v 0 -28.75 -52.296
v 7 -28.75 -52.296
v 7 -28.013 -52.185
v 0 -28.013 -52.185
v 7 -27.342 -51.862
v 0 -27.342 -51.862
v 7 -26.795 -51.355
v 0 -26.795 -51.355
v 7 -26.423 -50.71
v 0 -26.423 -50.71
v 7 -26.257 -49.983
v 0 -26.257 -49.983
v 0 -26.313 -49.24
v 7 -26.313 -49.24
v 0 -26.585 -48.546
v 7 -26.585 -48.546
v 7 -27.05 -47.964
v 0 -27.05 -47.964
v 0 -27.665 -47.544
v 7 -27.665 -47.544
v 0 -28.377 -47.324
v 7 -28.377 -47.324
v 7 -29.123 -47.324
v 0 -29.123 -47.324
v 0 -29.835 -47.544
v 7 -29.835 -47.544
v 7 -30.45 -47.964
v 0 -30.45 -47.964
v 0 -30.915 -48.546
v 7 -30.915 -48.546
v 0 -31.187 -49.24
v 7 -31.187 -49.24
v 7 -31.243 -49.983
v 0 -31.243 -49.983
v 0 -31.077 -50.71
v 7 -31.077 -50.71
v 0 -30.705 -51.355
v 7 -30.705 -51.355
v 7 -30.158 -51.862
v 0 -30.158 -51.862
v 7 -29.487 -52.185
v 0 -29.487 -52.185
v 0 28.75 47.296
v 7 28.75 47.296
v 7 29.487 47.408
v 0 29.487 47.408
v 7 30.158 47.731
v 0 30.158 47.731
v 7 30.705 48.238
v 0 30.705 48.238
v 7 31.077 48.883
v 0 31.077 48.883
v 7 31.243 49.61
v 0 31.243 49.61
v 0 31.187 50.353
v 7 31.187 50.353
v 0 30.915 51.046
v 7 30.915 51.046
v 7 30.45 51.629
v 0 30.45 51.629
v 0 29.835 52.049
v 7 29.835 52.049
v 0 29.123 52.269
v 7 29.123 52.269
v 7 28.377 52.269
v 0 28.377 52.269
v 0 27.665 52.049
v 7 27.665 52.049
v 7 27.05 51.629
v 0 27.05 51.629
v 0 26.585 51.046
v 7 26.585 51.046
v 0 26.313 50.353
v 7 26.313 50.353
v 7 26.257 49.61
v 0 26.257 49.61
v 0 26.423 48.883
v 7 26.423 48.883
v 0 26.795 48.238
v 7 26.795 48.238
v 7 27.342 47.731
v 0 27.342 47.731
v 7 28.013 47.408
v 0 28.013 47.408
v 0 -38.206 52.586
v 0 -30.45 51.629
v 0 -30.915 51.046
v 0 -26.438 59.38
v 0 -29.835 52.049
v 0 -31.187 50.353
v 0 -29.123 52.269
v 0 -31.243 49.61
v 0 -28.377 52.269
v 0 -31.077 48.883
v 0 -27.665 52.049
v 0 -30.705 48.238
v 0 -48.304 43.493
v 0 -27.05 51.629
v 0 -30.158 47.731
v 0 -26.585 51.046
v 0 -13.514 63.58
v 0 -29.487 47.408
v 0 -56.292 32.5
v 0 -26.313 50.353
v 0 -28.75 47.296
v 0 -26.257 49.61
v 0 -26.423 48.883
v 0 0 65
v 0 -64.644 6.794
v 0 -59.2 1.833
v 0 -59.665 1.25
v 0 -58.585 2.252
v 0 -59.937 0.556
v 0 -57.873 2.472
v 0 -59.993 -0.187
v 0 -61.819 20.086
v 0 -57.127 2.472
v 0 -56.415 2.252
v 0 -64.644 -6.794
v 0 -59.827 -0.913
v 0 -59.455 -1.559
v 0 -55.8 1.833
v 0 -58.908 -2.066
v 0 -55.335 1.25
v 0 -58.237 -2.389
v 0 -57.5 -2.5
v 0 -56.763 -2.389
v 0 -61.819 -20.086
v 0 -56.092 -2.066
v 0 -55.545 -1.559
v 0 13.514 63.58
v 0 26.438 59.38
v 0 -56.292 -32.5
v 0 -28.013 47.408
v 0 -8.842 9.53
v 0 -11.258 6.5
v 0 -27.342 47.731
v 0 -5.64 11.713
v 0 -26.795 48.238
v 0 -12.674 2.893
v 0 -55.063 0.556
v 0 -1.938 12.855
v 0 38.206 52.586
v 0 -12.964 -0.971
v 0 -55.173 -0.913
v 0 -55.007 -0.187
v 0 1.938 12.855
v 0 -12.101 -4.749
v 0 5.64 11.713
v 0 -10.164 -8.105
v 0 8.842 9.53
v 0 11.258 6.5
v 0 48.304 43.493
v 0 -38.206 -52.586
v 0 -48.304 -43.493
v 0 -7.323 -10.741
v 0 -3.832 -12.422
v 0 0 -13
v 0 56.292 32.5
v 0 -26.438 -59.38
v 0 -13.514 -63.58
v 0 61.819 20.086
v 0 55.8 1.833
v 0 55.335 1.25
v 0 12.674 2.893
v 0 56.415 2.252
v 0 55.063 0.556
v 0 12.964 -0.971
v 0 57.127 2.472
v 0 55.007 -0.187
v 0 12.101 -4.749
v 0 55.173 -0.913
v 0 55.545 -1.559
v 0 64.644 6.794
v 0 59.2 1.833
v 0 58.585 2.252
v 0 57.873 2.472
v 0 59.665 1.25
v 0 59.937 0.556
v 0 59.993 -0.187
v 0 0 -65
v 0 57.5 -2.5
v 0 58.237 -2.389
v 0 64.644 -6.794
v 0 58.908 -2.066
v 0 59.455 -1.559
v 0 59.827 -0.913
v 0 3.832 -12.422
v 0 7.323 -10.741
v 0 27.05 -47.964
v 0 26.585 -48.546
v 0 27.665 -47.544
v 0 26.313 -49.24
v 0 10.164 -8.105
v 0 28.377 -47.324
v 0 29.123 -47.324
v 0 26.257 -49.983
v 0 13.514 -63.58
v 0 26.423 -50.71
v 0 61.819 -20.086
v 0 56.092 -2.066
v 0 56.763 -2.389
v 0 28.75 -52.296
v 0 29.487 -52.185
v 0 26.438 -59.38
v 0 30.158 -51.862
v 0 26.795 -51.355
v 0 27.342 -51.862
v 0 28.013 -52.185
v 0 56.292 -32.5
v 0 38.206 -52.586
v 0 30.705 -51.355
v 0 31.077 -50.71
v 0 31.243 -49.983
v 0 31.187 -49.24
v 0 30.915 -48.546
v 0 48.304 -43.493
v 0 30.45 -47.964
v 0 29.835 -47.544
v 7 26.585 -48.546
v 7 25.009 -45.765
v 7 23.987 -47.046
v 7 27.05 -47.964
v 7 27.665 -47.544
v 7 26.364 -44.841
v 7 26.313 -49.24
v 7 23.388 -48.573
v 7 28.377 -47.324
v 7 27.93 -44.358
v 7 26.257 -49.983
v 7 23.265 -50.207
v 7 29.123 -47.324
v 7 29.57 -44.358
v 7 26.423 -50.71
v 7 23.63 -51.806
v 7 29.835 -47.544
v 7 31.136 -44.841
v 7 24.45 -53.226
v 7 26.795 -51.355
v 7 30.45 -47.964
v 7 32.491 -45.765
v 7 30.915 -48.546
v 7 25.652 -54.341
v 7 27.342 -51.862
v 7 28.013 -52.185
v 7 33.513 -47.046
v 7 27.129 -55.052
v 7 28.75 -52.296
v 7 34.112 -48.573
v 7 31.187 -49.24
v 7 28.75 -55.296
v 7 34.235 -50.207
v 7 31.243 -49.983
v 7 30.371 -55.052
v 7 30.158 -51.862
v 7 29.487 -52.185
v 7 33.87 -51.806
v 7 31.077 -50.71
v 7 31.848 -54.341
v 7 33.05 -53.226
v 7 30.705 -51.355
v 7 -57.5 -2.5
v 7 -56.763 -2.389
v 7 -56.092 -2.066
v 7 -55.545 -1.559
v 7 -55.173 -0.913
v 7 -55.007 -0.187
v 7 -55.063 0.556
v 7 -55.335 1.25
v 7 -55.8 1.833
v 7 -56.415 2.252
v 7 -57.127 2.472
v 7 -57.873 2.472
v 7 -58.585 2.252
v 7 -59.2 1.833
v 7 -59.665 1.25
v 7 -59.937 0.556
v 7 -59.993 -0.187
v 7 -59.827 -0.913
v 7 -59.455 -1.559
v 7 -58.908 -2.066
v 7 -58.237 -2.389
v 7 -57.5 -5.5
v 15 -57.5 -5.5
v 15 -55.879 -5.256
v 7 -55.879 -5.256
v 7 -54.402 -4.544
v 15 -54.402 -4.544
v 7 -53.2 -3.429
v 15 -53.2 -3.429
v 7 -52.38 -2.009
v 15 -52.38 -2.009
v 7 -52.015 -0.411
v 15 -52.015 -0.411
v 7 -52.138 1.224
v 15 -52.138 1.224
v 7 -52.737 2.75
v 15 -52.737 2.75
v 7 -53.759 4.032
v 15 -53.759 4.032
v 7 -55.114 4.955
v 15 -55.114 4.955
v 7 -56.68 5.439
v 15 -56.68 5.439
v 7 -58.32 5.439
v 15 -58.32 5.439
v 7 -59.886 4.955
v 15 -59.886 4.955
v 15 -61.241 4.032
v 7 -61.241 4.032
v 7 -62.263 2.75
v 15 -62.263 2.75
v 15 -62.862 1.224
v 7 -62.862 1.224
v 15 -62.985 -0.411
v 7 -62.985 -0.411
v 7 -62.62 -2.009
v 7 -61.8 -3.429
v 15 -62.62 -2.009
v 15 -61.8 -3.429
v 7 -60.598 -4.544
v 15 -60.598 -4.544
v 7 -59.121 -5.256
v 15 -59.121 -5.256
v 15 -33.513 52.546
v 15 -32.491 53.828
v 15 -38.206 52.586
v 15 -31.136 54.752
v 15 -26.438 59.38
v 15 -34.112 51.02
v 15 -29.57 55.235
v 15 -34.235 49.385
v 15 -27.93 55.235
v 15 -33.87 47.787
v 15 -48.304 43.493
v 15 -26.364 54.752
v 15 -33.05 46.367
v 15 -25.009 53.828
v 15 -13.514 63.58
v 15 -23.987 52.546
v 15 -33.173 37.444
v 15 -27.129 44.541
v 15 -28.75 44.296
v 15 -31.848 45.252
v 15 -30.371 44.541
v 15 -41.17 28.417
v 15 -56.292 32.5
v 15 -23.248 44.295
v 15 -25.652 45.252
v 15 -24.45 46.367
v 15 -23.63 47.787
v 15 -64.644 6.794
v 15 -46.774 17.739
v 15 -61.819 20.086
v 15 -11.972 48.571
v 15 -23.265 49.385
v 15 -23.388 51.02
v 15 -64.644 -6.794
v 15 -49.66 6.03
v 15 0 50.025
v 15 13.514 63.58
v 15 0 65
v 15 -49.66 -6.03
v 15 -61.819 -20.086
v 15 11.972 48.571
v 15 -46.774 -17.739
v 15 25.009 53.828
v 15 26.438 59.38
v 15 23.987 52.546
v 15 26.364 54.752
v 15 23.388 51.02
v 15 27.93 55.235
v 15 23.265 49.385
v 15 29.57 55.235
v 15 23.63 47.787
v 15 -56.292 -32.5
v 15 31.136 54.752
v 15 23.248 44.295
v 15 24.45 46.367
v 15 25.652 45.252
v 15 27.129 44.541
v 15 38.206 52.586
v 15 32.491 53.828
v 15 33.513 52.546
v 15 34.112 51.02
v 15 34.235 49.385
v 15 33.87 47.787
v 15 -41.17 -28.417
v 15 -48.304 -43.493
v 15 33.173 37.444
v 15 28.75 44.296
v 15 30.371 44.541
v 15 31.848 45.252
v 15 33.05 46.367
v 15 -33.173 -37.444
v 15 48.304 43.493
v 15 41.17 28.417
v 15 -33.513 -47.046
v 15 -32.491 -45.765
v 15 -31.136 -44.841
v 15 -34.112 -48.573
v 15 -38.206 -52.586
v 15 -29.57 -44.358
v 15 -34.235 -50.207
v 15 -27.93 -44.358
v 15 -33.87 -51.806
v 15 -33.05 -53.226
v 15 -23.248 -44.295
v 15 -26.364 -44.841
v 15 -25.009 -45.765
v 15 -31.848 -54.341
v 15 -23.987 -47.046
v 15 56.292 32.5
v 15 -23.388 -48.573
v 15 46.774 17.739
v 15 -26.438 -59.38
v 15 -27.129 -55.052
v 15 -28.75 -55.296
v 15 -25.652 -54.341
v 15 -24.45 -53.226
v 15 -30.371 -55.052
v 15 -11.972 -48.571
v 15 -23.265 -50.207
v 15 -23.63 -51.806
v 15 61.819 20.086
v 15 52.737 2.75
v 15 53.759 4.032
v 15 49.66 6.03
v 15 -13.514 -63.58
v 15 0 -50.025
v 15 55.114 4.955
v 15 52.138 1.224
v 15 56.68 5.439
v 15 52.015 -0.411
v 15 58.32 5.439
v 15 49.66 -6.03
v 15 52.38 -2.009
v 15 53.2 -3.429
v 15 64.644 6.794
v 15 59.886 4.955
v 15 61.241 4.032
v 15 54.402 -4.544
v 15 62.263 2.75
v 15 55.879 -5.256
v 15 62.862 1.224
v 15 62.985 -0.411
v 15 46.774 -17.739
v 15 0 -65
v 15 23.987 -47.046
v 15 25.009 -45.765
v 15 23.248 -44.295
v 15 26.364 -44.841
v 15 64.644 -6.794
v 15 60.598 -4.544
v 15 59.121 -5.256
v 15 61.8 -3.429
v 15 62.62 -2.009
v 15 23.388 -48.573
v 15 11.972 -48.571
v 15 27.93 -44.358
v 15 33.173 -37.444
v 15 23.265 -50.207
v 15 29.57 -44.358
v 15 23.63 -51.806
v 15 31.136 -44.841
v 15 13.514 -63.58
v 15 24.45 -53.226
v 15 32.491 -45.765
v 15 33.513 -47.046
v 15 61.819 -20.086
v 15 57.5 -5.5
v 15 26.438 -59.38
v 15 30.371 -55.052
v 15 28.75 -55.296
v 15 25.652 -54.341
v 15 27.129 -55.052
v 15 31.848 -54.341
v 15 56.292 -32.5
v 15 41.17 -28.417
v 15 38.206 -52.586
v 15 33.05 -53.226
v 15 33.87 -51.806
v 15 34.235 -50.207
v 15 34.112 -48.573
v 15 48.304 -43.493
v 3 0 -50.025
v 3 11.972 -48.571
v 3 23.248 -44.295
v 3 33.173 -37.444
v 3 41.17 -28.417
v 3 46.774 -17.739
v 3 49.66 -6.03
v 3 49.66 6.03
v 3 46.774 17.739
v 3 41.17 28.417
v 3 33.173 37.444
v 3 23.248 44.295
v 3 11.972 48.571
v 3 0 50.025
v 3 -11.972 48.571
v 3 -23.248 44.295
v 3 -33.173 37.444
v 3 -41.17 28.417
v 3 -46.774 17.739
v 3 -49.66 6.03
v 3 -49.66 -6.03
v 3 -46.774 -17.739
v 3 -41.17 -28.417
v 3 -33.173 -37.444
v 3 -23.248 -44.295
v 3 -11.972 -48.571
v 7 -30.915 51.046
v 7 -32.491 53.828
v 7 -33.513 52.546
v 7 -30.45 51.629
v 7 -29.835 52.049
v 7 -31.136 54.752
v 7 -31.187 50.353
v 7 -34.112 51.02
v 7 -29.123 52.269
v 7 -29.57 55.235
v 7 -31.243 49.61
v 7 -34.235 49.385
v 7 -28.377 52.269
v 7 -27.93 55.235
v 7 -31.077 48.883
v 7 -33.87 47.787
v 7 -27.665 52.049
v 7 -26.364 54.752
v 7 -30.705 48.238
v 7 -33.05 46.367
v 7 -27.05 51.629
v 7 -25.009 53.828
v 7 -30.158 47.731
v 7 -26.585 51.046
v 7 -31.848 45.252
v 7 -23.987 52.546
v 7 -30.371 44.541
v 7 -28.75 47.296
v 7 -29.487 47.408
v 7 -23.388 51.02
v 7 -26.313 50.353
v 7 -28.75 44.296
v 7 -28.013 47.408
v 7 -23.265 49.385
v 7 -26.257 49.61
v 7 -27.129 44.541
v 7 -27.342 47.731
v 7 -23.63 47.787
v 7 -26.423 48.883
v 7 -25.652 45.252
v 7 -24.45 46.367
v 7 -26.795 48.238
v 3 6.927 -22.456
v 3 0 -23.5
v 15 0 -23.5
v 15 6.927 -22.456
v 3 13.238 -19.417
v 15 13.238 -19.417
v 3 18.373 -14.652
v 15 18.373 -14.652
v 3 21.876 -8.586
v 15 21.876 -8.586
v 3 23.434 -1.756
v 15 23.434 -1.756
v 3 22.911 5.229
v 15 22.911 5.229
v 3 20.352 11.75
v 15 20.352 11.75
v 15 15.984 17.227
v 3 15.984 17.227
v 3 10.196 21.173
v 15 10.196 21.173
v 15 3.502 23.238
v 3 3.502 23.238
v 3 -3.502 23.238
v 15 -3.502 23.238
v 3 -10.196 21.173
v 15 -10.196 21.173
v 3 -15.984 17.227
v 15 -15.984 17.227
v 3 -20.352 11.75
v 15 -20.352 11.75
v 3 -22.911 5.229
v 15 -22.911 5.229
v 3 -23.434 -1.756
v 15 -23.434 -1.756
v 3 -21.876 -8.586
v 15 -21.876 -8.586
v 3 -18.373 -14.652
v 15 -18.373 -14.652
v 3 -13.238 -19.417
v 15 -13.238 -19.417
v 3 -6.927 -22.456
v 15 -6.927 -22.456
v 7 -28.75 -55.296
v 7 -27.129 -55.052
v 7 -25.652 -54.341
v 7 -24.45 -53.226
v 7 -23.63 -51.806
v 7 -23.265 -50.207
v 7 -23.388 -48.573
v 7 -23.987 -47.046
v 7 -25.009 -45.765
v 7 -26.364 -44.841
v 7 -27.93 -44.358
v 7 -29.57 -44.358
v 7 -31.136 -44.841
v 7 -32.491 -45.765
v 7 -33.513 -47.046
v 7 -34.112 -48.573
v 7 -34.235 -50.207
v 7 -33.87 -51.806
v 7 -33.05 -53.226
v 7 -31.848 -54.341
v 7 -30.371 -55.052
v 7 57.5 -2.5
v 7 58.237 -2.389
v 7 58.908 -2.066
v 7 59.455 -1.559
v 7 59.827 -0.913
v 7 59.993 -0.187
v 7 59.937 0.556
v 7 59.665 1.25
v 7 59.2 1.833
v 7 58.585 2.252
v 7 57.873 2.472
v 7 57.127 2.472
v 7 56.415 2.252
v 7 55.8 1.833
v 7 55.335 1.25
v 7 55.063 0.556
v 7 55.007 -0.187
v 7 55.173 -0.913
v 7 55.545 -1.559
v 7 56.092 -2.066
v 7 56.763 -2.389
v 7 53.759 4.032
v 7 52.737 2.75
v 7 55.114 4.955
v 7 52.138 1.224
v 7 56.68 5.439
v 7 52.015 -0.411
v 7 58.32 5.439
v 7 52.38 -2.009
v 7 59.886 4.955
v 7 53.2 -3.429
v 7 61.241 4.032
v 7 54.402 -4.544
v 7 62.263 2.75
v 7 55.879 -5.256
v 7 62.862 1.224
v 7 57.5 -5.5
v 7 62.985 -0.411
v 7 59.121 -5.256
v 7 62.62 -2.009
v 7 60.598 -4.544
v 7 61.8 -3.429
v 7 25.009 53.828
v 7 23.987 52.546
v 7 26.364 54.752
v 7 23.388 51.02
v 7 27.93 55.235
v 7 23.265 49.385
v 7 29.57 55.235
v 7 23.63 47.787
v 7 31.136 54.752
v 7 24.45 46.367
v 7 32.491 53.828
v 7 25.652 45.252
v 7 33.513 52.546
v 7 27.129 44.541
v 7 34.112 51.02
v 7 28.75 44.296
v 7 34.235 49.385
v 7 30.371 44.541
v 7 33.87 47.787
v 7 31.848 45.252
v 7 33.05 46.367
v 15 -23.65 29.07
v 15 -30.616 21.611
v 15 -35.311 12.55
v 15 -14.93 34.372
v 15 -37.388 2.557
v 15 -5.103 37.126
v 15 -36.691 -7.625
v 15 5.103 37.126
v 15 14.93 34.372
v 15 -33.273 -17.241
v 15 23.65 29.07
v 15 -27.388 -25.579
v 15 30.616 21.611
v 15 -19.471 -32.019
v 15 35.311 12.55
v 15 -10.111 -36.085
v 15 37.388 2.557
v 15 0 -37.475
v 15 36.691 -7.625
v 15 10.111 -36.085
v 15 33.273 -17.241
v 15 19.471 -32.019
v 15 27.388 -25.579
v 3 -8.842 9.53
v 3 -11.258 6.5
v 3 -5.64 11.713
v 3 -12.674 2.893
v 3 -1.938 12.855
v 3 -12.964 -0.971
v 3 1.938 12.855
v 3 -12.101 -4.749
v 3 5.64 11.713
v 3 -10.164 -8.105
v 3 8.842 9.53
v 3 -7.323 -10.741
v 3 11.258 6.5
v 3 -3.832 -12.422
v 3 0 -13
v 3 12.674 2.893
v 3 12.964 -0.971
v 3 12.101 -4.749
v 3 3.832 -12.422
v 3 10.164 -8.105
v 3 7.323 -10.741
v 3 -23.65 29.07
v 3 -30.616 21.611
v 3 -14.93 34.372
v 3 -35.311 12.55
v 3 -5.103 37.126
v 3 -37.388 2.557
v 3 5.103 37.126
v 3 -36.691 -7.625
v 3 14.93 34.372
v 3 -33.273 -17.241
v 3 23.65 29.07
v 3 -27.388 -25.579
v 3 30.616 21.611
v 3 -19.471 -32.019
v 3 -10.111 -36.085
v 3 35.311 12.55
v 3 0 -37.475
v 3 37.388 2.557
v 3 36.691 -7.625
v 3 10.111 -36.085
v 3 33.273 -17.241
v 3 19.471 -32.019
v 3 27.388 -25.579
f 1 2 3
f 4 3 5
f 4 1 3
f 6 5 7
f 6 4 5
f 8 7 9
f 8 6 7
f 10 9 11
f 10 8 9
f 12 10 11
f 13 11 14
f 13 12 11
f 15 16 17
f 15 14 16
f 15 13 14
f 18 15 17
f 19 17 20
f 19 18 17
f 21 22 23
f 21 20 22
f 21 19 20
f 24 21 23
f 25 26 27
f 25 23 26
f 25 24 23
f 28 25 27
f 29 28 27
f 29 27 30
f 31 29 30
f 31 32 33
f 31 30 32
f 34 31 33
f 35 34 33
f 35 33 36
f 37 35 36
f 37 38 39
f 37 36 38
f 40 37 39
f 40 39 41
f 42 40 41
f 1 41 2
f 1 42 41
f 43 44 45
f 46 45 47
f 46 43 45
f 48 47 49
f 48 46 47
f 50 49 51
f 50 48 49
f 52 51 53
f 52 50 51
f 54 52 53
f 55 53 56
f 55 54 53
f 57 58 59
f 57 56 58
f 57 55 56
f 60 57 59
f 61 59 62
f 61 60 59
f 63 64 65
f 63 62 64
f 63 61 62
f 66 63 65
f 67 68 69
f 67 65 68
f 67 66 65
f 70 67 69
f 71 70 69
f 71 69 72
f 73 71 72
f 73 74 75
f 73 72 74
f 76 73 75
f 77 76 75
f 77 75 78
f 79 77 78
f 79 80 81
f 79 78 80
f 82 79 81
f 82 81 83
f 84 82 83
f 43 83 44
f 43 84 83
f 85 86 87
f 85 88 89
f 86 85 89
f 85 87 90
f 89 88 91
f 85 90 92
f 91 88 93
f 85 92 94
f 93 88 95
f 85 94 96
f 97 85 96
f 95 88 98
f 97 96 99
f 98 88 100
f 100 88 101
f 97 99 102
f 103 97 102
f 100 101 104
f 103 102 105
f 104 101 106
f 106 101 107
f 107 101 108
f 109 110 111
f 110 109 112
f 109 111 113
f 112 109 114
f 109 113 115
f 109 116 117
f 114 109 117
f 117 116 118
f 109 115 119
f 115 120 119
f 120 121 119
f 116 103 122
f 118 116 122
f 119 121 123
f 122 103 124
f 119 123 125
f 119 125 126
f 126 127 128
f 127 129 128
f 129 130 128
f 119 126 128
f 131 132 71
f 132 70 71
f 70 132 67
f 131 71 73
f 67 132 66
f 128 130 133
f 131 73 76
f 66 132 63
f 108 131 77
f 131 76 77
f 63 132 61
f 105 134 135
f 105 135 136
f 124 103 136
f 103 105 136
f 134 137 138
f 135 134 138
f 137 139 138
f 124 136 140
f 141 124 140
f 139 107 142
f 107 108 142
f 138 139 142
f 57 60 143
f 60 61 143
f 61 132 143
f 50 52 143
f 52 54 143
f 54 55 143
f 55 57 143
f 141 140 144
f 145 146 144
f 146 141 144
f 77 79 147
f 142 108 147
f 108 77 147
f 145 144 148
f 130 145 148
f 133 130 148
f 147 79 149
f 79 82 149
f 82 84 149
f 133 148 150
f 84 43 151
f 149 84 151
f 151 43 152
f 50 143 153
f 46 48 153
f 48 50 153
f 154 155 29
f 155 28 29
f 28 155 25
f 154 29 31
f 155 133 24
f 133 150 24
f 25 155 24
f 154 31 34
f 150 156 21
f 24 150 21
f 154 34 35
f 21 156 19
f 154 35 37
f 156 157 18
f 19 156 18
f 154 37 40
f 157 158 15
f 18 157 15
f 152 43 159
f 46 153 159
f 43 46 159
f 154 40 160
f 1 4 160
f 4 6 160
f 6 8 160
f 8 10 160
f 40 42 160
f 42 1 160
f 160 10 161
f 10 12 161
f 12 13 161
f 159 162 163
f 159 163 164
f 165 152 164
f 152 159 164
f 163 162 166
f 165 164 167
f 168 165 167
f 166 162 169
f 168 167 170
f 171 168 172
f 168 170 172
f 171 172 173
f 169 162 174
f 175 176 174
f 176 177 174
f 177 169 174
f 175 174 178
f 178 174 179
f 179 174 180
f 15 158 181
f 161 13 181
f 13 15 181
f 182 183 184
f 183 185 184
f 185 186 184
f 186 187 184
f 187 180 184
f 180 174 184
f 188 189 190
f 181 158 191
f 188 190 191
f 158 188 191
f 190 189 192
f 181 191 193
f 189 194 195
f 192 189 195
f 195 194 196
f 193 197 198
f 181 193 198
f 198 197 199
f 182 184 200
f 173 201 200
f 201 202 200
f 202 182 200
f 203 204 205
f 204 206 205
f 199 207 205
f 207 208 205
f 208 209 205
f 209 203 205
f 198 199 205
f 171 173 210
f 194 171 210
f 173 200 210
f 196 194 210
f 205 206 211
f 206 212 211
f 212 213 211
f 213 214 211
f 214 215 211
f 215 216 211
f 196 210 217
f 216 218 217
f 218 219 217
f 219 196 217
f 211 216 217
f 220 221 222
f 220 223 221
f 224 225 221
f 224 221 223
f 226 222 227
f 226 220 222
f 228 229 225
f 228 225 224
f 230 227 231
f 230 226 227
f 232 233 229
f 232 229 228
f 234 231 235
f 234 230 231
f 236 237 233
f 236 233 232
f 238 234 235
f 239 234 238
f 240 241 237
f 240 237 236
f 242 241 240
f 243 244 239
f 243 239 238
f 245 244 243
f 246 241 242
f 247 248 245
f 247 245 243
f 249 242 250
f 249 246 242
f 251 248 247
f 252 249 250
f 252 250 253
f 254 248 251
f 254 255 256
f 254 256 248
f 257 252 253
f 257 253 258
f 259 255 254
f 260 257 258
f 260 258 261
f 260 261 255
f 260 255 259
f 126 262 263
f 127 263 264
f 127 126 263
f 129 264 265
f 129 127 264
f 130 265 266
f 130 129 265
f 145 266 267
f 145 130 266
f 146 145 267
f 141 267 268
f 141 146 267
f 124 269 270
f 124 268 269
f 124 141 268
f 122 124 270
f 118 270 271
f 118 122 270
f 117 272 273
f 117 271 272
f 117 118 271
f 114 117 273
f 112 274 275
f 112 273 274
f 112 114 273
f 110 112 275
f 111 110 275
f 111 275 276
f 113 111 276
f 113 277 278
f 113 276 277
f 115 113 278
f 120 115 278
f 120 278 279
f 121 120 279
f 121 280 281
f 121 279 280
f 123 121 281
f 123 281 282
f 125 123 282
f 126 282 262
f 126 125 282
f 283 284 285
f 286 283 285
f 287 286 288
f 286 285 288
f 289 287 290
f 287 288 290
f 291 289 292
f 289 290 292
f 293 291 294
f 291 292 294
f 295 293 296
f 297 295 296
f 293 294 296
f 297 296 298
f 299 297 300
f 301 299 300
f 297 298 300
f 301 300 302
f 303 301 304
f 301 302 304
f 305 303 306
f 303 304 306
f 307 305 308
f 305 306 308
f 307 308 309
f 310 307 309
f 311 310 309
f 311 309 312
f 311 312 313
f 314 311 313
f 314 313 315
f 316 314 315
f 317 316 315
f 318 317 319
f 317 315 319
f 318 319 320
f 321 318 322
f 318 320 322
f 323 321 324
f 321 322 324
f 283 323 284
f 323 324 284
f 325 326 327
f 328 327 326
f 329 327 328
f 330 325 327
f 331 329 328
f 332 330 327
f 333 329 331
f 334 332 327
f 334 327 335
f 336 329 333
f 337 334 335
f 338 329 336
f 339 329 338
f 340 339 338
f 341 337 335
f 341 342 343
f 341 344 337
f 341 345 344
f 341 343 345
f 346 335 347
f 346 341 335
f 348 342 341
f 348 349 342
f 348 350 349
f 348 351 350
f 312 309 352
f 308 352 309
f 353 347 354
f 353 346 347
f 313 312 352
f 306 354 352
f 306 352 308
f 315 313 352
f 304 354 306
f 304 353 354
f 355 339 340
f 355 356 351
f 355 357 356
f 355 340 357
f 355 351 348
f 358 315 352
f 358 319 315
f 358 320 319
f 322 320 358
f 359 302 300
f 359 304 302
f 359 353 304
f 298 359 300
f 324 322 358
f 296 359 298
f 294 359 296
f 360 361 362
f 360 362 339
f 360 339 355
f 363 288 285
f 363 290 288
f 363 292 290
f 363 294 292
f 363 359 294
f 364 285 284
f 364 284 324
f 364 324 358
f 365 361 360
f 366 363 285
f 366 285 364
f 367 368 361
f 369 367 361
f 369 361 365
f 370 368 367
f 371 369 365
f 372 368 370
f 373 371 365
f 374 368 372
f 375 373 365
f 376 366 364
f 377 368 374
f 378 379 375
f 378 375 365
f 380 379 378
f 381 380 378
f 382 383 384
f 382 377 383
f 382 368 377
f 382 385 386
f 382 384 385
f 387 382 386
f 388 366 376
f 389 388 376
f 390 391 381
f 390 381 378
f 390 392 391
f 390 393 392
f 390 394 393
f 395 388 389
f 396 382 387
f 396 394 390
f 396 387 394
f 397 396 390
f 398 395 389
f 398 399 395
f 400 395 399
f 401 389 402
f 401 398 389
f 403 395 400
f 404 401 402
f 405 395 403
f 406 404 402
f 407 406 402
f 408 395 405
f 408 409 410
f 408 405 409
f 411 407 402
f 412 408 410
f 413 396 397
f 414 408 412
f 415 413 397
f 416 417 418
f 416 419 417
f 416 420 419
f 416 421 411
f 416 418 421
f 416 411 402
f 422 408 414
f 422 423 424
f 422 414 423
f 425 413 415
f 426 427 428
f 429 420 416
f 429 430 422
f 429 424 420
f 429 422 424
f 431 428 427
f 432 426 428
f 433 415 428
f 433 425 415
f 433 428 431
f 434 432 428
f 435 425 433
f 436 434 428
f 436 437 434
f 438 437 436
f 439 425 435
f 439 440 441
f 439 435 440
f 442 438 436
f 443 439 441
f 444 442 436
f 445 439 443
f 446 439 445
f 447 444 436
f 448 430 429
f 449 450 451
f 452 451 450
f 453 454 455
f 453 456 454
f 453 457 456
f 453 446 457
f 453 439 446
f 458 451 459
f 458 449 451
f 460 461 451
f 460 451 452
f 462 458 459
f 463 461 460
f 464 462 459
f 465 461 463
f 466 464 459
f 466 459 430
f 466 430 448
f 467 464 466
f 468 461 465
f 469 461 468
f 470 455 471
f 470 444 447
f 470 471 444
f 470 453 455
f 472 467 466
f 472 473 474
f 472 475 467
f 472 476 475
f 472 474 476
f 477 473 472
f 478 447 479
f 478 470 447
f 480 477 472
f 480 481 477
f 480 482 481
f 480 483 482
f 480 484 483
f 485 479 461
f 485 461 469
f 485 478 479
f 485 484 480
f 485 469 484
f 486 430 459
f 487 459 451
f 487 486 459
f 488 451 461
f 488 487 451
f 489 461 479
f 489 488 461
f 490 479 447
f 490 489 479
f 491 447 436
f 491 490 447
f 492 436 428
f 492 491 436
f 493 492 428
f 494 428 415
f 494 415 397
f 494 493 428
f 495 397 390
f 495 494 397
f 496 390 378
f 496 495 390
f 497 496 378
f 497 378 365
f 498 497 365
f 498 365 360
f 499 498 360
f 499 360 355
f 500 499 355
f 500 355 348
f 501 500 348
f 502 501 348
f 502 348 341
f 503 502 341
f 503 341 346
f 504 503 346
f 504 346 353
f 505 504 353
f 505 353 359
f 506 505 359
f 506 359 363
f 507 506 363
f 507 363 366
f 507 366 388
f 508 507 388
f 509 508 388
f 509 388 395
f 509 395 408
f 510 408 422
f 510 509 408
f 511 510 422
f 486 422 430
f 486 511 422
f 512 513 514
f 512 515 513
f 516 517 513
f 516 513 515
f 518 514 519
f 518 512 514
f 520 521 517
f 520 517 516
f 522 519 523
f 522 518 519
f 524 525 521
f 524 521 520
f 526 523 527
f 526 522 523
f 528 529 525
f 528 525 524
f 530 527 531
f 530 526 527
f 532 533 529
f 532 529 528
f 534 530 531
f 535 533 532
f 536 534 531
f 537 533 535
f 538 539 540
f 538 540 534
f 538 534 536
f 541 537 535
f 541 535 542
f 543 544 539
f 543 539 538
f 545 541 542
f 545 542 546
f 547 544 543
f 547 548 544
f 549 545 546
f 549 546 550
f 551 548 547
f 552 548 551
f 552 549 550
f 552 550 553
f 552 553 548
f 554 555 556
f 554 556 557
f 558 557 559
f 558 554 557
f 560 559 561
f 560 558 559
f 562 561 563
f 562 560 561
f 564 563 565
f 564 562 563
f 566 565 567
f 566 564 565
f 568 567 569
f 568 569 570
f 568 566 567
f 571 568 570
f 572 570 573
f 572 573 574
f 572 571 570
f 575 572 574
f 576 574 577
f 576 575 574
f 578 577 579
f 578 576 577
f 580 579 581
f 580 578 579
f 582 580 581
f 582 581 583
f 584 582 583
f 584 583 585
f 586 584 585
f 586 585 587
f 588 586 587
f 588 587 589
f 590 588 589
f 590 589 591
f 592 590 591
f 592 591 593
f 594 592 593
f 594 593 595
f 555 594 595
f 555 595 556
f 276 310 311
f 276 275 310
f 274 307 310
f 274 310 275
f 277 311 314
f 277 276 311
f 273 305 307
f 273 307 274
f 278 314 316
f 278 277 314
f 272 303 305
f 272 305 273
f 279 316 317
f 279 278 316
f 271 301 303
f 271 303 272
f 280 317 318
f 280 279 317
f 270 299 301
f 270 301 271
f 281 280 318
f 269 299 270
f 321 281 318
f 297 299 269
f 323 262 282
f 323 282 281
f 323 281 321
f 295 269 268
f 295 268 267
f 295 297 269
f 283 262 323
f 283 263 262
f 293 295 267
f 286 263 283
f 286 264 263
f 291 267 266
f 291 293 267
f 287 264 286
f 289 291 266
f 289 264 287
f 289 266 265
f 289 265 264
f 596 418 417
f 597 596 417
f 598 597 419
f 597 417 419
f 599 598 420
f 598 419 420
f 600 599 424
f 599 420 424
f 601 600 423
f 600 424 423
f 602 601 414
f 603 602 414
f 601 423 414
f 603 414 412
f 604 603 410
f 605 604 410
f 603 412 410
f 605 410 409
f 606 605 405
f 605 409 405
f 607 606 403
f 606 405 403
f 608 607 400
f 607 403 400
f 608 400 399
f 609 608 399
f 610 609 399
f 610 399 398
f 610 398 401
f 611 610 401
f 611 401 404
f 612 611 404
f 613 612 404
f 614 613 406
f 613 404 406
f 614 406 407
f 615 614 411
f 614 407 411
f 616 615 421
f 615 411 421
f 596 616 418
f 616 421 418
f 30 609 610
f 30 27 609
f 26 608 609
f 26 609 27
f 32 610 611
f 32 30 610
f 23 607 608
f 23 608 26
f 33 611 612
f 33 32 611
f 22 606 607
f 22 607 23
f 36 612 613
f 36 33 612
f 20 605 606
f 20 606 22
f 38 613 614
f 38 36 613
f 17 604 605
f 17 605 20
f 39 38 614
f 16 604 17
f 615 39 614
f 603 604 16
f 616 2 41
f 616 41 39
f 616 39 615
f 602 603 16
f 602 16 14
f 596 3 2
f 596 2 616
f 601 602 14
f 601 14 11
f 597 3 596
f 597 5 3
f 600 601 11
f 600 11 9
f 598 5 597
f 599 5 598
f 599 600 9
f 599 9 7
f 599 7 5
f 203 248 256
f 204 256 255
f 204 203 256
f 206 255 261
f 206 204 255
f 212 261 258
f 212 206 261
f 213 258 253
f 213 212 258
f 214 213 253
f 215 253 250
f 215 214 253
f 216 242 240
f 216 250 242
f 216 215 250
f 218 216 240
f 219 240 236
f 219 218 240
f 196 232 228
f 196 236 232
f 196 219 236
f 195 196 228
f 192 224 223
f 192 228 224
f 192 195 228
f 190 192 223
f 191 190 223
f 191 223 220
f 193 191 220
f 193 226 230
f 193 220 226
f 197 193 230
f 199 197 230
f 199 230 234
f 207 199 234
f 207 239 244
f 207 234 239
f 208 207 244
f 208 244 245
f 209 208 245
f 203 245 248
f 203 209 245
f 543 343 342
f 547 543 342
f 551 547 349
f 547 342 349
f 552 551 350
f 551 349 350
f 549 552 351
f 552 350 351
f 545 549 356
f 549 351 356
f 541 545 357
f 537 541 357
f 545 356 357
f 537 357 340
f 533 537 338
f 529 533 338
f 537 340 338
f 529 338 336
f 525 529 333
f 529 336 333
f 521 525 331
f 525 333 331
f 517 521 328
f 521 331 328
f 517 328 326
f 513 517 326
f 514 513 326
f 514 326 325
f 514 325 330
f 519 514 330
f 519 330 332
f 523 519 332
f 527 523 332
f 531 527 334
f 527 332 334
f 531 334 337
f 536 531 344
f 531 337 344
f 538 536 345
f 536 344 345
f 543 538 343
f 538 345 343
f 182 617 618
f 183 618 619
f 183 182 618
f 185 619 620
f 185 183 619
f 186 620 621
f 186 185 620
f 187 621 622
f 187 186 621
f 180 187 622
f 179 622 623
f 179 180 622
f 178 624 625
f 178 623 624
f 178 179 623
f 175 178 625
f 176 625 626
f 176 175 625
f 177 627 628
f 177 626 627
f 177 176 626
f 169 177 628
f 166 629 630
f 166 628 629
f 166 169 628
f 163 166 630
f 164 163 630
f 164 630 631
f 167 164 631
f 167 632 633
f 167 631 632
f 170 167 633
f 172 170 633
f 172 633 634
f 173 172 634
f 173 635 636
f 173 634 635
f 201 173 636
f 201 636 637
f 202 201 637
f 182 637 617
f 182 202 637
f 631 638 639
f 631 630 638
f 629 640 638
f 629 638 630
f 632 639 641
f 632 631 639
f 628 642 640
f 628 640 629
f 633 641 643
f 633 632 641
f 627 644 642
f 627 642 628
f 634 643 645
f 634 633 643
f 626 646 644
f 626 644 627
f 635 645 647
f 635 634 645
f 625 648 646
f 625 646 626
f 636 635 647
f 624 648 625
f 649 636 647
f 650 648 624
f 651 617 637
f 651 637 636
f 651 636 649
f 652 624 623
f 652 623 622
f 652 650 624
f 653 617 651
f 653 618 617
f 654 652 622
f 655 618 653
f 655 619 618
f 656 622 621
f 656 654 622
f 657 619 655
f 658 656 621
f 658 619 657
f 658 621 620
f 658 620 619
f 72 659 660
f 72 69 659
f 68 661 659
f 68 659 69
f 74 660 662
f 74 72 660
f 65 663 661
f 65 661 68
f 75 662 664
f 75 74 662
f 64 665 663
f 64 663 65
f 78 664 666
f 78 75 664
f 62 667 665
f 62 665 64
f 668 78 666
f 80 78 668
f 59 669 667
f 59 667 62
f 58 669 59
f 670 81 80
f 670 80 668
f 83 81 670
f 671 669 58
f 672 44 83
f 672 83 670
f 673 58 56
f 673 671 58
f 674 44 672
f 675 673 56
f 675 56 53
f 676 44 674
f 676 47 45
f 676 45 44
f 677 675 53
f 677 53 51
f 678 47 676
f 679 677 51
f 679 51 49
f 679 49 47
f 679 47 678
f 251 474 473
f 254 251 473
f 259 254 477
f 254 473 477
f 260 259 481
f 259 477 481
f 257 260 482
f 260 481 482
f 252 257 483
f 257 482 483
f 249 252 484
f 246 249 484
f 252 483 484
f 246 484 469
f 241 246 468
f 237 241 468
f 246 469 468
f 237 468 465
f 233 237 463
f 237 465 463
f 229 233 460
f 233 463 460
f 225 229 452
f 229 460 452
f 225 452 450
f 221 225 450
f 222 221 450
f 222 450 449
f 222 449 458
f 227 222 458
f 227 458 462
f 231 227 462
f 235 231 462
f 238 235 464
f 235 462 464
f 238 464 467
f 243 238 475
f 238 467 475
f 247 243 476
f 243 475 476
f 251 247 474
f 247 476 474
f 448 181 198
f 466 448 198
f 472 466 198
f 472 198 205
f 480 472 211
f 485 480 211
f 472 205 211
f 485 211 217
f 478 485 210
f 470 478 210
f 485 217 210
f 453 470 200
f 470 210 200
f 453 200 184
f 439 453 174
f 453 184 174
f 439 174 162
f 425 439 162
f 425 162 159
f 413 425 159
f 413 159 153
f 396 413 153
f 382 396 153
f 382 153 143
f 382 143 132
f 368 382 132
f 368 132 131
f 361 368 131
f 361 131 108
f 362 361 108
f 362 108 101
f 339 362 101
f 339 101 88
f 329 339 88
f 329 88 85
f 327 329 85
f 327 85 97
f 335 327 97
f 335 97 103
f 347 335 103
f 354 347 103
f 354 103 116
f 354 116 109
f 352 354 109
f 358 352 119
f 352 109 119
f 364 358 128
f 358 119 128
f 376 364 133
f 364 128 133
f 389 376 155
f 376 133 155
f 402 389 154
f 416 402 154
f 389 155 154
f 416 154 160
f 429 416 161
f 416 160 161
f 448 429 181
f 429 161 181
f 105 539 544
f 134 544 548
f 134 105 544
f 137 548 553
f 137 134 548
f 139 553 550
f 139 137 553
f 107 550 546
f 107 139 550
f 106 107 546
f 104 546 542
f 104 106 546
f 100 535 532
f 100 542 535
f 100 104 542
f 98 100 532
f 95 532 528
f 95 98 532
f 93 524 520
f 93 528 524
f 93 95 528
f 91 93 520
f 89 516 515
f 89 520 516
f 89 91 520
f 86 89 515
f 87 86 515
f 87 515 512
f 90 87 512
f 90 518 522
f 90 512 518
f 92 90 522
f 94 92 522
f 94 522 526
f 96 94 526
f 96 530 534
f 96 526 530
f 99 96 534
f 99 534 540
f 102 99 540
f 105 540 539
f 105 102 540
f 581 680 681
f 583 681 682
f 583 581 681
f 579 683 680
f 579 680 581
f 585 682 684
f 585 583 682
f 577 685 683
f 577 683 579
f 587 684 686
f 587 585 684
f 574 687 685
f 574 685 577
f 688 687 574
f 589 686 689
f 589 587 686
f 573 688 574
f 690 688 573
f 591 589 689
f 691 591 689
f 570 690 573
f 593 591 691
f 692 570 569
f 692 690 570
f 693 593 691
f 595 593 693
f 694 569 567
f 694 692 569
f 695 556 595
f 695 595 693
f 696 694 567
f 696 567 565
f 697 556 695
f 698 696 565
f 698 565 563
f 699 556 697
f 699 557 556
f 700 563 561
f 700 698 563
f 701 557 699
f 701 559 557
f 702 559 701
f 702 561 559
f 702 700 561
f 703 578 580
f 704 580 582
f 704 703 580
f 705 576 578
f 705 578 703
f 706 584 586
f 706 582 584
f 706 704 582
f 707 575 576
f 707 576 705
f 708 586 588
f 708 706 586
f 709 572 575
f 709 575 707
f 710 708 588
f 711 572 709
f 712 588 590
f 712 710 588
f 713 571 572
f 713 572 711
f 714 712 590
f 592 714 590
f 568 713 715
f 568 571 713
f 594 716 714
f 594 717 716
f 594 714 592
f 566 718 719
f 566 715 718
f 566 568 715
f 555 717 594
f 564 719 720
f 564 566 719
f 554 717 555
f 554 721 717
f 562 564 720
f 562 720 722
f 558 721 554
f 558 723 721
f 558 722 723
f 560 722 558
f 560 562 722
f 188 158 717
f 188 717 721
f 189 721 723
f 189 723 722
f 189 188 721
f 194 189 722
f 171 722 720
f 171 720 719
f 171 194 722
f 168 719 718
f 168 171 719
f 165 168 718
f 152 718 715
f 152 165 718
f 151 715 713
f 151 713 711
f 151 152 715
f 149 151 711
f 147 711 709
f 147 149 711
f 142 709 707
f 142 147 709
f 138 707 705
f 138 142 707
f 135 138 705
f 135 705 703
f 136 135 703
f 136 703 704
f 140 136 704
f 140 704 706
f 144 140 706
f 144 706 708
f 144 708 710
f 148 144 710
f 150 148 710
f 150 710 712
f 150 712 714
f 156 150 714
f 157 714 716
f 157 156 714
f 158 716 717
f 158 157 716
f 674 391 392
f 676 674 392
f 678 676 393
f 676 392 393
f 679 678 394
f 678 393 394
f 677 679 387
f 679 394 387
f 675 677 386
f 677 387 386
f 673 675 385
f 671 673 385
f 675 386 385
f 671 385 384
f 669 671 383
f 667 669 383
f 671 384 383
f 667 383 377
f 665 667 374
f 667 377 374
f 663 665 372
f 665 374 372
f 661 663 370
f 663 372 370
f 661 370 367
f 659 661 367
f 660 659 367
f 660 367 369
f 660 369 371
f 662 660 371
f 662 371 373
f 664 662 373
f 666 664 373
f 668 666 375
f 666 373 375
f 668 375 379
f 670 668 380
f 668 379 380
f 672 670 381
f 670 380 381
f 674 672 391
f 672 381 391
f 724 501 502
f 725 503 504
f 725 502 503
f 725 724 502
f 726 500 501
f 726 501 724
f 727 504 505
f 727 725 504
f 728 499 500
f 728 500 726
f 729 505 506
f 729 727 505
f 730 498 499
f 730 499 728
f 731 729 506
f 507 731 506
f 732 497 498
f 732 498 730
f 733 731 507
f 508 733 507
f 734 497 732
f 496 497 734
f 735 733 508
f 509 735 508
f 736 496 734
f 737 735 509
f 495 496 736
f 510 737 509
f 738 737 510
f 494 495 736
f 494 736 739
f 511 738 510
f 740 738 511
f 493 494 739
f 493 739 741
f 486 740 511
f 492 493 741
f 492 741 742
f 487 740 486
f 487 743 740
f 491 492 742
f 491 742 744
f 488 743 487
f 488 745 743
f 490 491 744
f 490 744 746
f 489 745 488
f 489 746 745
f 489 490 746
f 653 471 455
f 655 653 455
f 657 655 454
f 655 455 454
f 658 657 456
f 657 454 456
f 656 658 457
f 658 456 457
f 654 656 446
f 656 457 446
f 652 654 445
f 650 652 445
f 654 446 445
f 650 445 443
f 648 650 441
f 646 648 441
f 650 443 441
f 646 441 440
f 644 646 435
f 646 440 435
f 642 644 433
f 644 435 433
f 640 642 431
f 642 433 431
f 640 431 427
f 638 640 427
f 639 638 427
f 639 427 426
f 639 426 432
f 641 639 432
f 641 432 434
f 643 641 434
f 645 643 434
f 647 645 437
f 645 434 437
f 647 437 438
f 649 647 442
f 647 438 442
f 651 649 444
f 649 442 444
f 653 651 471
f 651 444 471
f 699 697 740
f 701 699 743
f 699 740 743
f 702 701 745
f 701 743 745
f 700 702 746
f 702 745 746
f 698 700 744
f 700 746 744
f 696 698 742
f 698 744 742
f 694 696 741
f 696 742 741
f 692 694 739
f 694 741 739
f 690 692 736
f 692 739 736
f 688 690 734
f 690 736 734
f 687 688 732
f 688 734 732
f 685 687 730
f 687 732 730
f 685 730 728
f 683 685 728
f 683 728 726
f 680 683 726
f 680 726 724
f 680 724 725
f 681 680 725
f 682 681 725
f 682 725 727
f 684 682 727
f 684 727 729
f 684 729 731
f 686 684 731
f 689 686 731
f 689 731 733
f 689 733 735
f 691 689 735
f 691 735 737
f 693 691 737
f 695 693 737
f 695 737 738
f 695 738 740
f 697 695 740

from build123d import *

# Parameters (mm, degrees)
SKETCH1_R                     = 65
SKETCH1_R_2                   = 13
SKETCH1_R_3                   = 2.5
LAYER_EXTRUDE_DEPTH           = 3
SKETCH1_3_R                   = 65
SKETCH1_3_R_2                 = 2.5
SKETCH1_3_R_3                 = 50.025
SKETCH1_3_R_4                 = 37.475
SKETCH1_3_R_5                 = 23.5
BEARING_SUPPORT_EXTRUDE_DEPTH = 15
SKETCH2_R                     = 5.5
CUT_EXTRUDE1_DEPTH            = 8


with BuildPart() as part:
    # Sketch1 → layer_extrude (new body)
    with BuildSketch(Plane(origin=(0, 0, 0), x_dir=(0, 0, -1), z_dir=(1, 0, 0))):
        Circle(SKETCH1_R)
        Circle(SKETCH1_R_2, mode=Mode.SUBTRACT)
        with Locations((-49.796460718, -28.75)):
            Circle(SKETCH1_R_3, mode=Mode.SUBTRACT)
        with Locations((0, -57.5)):
            Circle(SKETCH1_R_3, mode=Mode.SUBTRACT)
        with Locations((49.796460718, -28.75)):
            Circle(SKETCH1_R_3, mode=Mode.SUBTRACT)
        with Locations((-49.796460718, 28.75)):
            Circle(SKETCH1_R_3, mode=Mode.SUBTRACT)
        with Locations((0, 57.5)):
            Circle(SKETCH1_R_3, mode=Mode.SUBTRACT)
        with Locations((49.796460718, 28.75)):
            Circle(SKETCH1_R_3, mode=Mode.SUBTRACT)
    extrude(amount=LAYER_EXTRUDE_DEPTH)

    # Sketch1<3> → bearing_support_extrude (add)
    # profile 1 of 2: a face of its own
    with BuildSketch(Plane(origin=(0, 0, 0), x_dir=(0, 0, -1), z_dir=(1, 0, 0))):
        Circle(SKETCH1_3_R)
        with Locations((-49.796460718, -28.75)):
            Circle(SKETCH1_3_R_2, mode=Mode.SUBTRACT)
        with Locations((0, -57.5)):
            Circle(SKETCH1_3_R_2, mode=Mode.SUBTRACT)
        with Locations((49.796460718, -28.75)):
            Circle(SKETCH1_3_R_2, mode=Mode.SUBTRACT)
        with Locations((-49.796460718, 28.75)):
            Circle(SKETCH1_3_R_2, mode=Mode.SUBTRACT)
        Circle(SKETCH1_3_R_3, mode=Mode.SUBTRACT)
        with Locations((49.796460718, 28.75)):
            Circle(SKETCH1_3_R_2, mode=Mode.SUBTRACT)
        with Locations((0, 57.5)):
            Circle(SKETCH1_3_R_2, mode=Mode.SUBTRACT)
    # profile 2 of 2: a face of its own
    with BuildSketch(Plane(origin=(0, 0, 0), x_dir=(0, 0, -1), z_dir=(1, 0, 0))):
        Circle(SKETCH1_3_R_4)
        Circle(SKETCH1_3_R_5, mode=Mode.SUBTRACT)
    extrude(amount=BEARING_SUPPORT_EXTRUDE_DEPTH)

    # Sketch2 → Cut-Extrude1 (cut)
    with BuildSketch(Plane(origin=(15, 0, 0), x_dir=(0, 0, -1), z_dir=(1, 0, 0))):
        with Locations((0, 57.5)):
            Circle(SKETCH2_R)
        with Locations((49.796460718, 28.75)):
            Circle(SKETCH2_R)
        with Locations((49.796460718, -28.75)):
            Circle(SKETCH2_R)
        with Locations((0, -57.5)):
            Circle(SKETCH2_R)
        with Locations((-49.796460718, -28.75)):
            Circle(SKETCH2_R)
        with Locations((-49.796460718, 28.75)):
            Circle(SKETCH2_R)
    extrude(amount=-CUT_EXTRUDE1_DEPTH, mode=Mode.SUBTRACT)


solid = part.part
